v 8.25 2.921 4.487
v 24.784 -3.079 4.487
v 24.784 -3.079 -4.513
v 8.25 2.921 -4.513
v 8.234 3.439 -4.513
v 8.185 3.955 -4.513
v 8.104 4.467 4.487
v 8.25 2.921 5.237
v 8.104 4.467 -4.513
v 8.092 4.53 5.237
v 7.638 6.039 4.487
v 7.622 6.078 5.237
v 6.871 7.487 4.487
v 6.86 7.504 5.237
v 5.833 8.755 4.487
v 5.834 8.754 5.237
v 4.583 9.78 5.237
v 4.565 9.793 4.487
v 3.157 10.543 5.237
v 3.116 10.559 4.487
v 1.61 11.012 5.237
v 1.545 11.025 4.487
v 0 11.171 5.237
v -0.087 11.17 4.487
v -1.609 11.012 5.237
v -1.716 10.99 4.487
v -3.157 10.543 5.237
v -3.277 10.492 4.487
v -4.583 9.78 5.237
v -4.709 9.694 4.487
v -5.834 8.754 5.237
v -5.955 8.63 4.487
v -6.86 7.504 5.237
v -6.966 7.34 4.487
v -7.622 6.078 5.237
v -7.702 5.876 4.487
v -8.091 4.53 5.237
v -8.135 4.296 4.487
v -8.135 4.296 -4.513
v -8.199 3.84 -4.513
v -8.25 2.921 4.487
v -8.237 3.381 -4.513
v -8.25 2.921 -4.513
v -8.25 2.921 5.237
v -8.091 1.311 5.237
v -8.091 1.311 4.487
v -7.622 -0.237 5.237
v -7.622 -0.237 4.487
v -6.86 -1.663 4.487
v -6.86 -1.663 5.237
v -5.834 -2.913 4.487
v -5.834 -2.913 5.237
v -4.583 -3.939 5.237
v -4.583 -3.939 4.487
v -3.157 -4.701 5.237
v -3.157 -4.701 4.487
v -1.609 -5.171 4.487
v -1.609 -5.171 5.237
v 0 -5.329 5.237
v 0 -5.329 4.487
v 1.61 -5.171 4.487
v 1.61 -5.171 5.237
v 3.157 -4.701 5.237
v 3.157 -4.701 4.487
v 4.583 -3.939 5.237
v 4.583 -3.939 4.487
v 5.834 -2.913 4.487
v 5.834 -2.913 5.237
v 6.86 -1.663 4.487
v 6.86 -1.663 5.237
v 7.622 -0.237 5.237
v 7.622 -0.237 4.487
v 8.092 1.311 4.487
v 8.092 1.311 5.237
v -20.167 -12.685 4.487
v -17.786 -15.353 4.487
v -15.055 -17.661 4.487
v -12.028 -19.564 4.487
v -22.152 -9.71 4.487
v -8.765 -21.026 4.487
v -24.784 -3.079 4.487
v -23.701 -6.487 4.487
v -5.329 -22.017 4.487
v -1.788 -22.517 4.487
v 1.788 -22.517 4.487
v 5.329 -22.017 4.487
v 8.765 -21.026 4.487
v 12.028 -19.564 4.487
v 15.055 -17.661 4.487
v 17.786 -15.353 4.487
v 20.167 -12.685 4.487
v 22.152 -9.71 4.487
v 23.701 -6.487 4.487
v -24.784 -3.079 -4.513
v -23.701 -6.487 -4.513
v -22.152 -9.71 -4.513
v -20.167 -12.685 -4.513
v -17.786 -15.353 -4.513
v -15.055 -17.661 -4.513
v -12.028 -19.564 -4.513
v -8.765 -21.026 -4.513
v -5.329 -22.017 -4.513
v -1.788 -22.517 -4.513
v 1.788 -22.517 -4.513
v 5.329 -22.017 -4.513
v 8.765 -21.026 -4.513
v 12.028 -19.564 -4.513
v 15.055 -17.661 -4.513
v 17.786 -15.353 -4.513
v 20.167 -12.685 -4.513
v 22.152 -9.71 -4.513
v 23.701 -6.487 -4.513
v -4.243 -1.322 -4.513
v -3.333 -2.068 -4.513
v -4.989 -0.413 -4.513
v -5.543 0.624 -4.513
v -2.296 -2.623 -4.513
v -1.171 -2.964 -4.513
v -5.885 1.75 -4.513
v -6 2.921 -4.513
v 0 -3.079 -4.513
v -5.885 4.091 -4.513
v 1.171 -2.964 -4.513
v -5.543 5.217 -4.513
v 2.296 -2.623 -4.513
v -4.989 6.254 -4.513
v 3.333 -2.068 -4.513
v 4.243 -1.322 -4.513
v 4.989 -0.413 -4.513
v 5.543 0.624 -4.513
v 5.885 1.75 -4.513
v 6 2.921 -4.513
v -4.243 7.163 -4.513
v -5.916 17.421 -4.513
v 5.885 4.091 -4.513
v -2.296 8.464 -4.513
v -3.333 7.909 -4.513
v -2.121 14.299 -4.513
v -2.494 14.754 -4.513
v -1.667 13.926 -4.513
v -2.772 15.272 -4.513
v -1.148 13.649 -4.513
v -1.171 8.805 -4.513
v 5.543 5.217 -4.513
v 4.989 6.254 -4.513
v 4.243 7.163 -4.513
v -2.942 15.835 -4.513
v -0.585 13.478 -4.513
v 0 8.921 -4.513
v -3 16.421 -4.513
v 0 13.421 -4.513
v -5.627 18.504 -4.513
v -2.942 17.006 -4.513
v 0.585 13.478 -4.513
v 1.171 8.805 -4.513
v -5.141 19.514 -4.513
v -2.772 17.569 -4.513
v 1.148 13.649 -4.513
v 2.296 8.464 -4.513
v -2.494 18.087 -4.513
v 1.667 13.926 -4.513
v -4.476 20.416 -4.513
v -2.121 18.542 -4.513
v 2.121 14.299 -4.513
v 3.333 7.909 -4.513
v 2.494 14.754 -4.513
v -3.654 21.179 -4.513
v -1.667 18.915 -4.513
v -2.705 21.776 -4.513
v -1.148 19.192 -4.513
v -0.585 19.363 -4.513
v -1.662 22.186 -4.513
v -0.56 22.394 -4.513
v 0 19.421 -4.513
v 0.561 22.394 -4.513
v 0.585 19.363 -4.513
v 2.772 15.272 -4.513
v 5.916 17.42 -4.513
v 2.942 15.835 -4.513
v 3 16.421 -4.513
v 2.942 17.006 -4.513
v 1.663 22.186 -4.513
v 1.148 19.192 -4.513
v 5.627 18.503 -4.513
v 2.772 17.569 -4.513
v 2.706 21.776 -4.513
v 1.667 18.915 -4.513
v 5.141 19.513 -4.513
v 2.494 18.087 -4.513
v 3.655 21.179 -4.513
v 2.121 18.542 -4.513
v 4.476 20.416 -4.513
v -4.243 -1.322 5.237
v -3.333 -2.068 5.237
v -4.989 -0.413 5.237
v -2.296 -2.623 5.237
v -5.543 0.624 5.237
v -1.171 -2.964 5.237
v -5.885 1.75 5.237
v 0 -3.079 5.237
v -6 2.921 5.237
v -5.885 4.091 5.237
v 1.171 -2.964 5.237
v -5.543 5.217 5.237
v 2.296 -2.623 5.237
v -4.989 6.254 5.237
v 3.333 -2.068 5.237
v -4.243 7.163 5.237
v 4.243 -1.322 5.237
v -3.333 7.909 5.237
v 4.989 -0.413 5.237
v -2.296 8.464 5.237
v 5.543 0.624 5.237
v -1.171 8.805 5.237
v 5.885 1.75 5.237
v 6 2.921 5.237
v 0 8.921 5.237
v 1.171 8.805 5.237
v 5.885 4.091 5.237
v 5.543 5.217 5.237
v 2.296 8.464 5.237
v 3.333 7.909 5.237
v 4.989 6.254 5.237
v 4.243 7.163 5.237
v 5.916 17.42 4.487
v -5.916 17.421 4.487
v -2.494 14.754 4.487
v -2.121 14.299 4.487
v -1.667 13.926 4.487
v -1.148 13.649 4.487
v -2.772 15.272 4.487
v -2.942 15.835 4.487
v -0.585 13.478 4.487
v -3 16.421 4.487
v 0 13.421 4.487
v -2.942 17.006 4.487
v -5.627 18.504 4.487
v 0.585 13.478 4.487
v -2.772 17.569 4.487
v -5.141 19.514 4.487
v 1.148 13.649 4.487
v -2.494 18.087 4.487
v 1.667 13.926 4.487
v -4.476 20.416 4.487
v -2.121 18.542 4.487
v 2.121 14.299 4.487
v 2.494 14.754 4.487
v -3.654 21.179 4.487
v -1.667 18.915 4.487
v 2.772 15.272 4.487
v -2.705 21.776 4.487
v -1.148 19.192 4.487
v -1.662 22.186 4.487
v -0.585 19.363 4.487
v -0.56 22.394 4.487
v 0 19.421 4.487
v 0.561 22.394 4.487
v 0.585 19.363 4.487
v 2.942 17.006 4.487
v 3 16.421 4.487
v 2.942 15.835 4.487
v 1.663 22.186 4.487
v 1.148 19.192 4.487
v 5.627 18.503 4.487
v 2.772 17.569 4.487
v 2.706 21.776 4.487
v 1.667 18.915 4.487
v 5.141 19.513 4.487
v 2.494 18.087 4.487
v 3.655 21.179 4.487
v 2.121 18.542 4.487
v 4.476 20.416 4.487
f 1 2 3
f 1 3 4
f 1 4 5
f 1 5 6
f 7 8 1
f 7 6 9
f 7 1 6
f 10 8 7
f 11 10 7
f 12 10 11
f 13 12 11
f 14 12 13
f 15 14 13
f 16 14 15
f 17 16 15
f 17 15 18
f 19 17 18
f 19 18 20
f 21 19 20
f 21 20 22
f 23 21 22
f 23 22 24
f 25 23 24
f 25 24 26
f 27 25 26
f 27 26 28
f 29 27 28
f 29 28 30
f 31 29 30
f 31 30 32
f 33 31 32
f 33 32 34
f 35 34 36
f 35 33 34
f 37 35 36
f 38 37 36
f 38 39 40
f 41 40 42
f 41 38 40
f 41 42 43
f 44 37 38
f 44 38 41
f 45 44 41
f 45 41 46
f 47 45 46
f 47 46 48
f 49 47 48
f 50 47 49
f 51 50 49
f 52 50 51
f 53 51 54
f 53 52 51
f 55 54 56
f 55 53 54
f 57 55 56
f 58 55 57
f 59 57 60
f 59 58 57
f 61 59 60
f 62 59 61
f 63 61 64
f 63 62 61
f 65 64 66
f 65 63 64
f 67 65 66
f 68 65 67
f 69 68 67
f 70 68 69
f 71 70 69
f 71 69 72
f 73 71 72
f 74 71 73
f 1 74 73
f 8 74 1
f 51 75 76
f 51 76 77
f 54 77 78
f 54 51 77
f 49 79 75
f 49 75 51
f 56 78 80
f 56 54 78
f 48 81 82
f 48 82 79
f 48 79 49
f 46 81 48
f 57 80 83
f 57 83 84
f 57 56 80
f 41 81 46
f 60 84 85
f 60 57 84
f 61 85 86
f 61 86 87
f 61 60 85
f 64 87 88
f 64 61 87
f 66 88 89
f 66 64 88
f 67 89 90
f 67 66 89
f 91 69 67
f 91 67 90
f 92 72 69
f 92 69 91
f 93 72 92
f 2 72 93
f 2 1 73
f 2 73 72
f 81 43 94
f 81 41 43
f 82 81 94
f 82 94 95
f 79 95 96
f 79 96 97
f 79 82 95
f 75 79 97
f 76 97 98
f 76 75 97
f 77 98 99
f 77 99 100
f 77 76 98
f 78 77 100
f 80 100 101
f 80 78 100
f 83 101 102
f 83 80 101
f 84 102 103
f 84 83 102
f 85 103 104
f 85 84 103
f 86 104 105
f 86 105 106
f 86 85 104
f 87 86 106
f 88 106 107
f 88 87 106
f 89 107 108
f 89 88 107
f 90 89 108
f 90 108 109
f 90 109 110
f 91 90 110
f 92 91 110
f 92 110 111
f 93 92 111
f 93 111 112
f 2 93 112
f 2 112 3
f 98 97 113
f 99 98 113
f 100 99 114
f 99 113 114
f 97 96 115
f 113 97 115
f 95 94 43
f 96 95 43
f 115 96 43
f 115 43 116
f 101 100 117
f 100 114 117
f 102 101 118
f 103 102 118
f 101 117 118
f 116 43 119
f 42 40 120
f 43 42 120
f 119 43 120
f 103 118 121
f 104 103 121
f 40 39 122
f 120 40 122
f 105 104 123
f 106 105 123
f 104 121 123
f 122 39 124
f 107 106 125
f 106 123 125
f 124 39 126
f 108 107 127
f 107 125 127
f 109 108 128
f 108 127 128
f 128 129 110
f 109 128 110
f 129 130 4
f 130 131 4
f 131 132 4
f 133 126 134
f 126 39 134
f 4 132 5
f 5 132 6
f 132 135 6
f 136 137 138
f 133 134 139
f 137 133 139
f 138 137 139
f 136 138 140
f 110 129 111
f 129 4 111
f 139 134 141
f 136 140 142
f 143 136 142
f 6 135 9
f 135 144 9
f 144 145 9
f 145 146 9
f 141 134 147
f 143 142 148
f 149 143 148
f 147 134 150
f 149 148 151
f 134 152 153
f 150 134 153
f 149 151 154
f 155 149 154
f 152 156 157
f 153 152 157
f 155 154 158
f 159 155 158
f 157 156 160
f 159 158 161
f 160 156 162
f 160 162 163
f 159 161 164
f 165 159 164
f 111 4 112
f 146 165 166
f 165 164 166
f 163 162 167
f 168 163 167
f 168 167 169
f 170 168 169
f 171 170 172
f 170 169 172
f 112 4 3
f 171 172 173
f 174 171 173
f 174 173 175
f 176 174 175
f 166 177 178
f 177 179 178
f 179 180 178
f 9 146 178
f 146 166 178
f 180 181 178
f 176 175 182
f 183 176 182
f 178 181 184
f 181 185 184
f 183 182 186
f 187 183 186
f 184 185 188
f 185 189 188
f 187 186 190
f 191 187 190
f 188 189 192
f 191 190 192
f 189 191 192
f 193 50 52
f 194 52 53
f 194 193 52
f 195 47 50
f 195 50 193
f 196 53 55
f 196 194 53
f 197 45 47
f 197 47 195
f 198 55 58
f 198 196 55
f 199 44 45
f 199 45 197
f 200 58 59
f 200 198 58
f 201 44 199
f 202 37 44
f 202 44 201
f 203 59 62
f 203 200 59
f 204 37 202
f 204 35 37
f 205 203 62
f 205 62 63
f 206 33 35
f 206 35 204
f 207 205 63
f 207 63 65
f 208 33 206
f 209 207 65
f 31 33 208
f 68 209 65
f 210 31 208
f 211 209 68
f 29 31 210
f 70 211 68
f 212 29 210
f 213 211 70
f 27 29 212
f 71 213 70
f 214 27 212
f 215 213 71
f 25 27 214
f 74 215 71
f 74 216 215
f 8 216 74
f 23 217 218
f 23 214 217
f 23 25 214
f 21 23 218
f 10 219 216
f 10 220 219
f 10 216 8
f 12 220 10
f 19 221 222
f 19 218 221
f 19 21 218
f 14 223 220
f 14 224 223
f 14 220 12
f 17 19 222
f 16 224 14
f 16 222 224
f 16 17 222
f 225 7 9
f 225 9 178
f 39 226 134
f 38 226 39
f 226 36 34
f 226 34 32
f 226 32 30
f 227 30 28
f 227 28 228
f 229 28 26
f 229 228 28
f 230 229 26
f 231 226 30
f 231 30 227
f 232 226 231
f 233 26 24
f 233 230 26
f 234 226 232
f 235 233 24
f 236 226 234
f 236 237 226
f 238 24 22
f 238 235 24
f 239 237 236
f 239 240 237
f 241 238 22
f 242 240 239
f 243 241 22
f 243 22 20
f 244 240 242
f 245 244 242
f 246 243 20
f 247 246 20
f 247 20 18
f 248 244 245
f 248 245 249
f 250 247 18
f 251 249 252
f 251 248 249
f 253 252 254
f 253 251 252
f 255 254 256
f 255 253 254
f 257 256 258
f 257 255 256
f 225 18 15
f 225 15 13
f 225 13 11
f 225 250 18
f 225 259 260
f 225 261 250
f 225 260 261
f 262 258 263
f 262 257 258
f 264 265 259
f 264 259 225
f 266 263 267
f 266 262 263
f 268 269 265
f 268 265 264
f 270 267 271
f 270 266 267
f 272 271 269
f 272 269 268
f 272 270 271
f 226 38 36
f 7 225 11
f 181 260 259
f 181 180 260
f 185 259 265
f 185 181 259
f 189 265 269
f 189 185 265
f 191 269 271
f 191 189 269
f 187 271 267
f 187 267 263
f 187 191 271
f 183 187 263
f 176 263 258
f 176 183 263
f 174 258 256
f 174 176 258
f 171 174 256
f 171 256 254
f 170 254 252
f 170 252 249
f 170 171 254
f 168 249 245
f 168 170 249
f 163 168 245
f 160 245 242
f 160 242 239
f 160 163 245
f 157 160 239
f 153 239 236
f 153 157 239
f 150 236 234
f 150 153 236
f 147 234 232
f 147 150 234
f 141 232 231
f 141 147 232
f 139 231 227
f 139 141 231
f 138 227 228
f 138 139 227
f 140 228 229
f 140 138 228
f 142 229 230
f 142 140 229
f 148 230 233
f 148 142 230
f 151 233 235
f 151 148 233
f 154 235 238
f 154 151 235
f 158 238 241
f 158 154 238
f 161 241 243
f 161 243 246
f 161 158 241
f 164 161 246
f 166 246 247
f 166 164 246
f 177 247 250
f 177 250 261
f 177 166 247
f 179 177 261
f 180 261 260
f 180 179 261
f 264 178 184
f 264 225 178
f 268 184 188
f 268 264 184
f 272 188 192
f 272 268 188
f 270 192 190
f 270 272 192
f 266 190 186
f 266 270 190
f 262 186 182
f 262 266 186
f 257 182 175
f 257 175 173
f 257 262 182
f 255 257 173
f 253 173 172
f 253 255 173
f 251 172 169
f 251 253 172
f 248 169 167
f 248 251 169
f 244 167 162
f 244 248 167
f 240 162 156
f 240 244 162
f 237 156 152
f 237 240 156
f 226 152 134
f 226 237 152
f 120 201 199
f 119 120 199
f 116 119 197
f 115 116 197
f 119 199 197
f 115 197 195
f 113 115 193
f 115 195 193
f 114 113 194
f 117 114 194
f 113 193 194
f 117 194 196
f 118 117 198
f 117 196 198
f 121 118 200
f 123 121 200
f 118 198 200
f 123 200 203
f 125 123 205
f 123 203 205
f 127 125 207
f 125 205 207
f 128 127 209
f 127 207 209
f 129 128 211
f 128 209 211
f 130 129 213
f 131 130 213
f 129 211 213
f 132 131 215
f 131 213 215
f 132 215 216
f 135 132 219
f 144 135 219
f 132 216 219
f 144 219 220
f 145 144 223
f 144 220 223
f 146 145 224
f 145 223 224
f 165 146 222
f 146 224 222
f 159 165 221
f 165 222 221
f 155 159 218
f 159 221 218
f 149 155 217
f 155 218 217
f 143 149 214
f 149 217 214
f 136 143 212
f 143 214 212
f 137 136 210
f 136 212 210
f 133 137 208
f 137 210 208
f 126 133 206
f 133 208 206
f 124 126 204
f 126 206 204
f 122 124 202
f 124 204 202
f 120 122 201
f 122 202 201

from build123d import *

# Parameters (mm, degrees)
BOSS_EXTRUDE1_DEPTH   = 3
SKETCH1_R             = 2
BOSS_EXTRUDE1_2_DEPTH = 3
BOSS_EXTRUDE4_START   = 3.5
SKETCH1_6_R           = 5.5
SKETCH1_6_R_2         = 4
BOSS_EXTRUDE4_DEPTH   = 6.5
SCALE1_SCALE          = 1.5


with BuildPart() as part:
    # Sketch1 → Boss-Extrude1 (new, symmetric)
    with BuildSketch(Plane.XY):
        with BuildLine():
            Line((-5.5, 0), (-16.522711642, -4))
            ThreePointArc((-16.522711642, -4), (0, -17), (16.522711642, -4))
            Line((16.522711642, -4), (5.5, 0))
            ThreePointArc((5.5, 0), (0, -5.5), (-5.5, 0))
        make_face()
    extrude(amount=BOSS_EXTRUDE1_DEPTH, both=True)



with BuildPart() as body_2:
    # Sketch1 → Boss-Extrude1 2 (new, symmetric)
    with BuildSketch(Plane.XY):
        with BuildLine():
            Line((-3.944053189, 9.666666667), (-5.423073135, 0.916666667))
            ThreePointArc((-5.423073135, 0.916666667), (-0.058211757, 5.499691936), (5.402455316, 1.03125))
            Line((5.402455316, 1.03125), (3.944146954, 9.666111708))
            ThreePointArc((3.944146954, 9.666111708), (0.000281412, 12.99999999), (-3.944053189, 9.666666667))
        make_face()
        with Locations((0, 9)):
            Circle(SKETCH1_R, mode=Mode.SUBTRACT)
    extrude(amount=BOSS_EXTRUDE1_2_DEPTH, both=True)


with BuildPart() as part_1:
    add(part.part)

    add(body_2.part)  # Boss-Extrude4 merges body 2
    # Sketch1<6> → Boss-Extrude4 (add)
    with BuildSketch(Plane.XY.offset(BOSS_EXTRUDE4_START)):
        Circle(SKETCH1_6_R)
        with Locations(Location((0, 0, 0), (0, 0, 180))):
            Circle(SKETCH1_6_R_2, mode=Mode.SUBTRACT)
    extrude(amount=-BOSS_EXTRUDE4_DEPTH)


with BuildPart() as part_2:
    # Scale1: scaled about (-5.8229e-05, -5.841049103, 0.026355908)
    add(part_1.part.scale(SCALE1_SCALE).moved(Location((2.9115e-05, 2.920524551, -0.013177954))))


solid = part_2.part
